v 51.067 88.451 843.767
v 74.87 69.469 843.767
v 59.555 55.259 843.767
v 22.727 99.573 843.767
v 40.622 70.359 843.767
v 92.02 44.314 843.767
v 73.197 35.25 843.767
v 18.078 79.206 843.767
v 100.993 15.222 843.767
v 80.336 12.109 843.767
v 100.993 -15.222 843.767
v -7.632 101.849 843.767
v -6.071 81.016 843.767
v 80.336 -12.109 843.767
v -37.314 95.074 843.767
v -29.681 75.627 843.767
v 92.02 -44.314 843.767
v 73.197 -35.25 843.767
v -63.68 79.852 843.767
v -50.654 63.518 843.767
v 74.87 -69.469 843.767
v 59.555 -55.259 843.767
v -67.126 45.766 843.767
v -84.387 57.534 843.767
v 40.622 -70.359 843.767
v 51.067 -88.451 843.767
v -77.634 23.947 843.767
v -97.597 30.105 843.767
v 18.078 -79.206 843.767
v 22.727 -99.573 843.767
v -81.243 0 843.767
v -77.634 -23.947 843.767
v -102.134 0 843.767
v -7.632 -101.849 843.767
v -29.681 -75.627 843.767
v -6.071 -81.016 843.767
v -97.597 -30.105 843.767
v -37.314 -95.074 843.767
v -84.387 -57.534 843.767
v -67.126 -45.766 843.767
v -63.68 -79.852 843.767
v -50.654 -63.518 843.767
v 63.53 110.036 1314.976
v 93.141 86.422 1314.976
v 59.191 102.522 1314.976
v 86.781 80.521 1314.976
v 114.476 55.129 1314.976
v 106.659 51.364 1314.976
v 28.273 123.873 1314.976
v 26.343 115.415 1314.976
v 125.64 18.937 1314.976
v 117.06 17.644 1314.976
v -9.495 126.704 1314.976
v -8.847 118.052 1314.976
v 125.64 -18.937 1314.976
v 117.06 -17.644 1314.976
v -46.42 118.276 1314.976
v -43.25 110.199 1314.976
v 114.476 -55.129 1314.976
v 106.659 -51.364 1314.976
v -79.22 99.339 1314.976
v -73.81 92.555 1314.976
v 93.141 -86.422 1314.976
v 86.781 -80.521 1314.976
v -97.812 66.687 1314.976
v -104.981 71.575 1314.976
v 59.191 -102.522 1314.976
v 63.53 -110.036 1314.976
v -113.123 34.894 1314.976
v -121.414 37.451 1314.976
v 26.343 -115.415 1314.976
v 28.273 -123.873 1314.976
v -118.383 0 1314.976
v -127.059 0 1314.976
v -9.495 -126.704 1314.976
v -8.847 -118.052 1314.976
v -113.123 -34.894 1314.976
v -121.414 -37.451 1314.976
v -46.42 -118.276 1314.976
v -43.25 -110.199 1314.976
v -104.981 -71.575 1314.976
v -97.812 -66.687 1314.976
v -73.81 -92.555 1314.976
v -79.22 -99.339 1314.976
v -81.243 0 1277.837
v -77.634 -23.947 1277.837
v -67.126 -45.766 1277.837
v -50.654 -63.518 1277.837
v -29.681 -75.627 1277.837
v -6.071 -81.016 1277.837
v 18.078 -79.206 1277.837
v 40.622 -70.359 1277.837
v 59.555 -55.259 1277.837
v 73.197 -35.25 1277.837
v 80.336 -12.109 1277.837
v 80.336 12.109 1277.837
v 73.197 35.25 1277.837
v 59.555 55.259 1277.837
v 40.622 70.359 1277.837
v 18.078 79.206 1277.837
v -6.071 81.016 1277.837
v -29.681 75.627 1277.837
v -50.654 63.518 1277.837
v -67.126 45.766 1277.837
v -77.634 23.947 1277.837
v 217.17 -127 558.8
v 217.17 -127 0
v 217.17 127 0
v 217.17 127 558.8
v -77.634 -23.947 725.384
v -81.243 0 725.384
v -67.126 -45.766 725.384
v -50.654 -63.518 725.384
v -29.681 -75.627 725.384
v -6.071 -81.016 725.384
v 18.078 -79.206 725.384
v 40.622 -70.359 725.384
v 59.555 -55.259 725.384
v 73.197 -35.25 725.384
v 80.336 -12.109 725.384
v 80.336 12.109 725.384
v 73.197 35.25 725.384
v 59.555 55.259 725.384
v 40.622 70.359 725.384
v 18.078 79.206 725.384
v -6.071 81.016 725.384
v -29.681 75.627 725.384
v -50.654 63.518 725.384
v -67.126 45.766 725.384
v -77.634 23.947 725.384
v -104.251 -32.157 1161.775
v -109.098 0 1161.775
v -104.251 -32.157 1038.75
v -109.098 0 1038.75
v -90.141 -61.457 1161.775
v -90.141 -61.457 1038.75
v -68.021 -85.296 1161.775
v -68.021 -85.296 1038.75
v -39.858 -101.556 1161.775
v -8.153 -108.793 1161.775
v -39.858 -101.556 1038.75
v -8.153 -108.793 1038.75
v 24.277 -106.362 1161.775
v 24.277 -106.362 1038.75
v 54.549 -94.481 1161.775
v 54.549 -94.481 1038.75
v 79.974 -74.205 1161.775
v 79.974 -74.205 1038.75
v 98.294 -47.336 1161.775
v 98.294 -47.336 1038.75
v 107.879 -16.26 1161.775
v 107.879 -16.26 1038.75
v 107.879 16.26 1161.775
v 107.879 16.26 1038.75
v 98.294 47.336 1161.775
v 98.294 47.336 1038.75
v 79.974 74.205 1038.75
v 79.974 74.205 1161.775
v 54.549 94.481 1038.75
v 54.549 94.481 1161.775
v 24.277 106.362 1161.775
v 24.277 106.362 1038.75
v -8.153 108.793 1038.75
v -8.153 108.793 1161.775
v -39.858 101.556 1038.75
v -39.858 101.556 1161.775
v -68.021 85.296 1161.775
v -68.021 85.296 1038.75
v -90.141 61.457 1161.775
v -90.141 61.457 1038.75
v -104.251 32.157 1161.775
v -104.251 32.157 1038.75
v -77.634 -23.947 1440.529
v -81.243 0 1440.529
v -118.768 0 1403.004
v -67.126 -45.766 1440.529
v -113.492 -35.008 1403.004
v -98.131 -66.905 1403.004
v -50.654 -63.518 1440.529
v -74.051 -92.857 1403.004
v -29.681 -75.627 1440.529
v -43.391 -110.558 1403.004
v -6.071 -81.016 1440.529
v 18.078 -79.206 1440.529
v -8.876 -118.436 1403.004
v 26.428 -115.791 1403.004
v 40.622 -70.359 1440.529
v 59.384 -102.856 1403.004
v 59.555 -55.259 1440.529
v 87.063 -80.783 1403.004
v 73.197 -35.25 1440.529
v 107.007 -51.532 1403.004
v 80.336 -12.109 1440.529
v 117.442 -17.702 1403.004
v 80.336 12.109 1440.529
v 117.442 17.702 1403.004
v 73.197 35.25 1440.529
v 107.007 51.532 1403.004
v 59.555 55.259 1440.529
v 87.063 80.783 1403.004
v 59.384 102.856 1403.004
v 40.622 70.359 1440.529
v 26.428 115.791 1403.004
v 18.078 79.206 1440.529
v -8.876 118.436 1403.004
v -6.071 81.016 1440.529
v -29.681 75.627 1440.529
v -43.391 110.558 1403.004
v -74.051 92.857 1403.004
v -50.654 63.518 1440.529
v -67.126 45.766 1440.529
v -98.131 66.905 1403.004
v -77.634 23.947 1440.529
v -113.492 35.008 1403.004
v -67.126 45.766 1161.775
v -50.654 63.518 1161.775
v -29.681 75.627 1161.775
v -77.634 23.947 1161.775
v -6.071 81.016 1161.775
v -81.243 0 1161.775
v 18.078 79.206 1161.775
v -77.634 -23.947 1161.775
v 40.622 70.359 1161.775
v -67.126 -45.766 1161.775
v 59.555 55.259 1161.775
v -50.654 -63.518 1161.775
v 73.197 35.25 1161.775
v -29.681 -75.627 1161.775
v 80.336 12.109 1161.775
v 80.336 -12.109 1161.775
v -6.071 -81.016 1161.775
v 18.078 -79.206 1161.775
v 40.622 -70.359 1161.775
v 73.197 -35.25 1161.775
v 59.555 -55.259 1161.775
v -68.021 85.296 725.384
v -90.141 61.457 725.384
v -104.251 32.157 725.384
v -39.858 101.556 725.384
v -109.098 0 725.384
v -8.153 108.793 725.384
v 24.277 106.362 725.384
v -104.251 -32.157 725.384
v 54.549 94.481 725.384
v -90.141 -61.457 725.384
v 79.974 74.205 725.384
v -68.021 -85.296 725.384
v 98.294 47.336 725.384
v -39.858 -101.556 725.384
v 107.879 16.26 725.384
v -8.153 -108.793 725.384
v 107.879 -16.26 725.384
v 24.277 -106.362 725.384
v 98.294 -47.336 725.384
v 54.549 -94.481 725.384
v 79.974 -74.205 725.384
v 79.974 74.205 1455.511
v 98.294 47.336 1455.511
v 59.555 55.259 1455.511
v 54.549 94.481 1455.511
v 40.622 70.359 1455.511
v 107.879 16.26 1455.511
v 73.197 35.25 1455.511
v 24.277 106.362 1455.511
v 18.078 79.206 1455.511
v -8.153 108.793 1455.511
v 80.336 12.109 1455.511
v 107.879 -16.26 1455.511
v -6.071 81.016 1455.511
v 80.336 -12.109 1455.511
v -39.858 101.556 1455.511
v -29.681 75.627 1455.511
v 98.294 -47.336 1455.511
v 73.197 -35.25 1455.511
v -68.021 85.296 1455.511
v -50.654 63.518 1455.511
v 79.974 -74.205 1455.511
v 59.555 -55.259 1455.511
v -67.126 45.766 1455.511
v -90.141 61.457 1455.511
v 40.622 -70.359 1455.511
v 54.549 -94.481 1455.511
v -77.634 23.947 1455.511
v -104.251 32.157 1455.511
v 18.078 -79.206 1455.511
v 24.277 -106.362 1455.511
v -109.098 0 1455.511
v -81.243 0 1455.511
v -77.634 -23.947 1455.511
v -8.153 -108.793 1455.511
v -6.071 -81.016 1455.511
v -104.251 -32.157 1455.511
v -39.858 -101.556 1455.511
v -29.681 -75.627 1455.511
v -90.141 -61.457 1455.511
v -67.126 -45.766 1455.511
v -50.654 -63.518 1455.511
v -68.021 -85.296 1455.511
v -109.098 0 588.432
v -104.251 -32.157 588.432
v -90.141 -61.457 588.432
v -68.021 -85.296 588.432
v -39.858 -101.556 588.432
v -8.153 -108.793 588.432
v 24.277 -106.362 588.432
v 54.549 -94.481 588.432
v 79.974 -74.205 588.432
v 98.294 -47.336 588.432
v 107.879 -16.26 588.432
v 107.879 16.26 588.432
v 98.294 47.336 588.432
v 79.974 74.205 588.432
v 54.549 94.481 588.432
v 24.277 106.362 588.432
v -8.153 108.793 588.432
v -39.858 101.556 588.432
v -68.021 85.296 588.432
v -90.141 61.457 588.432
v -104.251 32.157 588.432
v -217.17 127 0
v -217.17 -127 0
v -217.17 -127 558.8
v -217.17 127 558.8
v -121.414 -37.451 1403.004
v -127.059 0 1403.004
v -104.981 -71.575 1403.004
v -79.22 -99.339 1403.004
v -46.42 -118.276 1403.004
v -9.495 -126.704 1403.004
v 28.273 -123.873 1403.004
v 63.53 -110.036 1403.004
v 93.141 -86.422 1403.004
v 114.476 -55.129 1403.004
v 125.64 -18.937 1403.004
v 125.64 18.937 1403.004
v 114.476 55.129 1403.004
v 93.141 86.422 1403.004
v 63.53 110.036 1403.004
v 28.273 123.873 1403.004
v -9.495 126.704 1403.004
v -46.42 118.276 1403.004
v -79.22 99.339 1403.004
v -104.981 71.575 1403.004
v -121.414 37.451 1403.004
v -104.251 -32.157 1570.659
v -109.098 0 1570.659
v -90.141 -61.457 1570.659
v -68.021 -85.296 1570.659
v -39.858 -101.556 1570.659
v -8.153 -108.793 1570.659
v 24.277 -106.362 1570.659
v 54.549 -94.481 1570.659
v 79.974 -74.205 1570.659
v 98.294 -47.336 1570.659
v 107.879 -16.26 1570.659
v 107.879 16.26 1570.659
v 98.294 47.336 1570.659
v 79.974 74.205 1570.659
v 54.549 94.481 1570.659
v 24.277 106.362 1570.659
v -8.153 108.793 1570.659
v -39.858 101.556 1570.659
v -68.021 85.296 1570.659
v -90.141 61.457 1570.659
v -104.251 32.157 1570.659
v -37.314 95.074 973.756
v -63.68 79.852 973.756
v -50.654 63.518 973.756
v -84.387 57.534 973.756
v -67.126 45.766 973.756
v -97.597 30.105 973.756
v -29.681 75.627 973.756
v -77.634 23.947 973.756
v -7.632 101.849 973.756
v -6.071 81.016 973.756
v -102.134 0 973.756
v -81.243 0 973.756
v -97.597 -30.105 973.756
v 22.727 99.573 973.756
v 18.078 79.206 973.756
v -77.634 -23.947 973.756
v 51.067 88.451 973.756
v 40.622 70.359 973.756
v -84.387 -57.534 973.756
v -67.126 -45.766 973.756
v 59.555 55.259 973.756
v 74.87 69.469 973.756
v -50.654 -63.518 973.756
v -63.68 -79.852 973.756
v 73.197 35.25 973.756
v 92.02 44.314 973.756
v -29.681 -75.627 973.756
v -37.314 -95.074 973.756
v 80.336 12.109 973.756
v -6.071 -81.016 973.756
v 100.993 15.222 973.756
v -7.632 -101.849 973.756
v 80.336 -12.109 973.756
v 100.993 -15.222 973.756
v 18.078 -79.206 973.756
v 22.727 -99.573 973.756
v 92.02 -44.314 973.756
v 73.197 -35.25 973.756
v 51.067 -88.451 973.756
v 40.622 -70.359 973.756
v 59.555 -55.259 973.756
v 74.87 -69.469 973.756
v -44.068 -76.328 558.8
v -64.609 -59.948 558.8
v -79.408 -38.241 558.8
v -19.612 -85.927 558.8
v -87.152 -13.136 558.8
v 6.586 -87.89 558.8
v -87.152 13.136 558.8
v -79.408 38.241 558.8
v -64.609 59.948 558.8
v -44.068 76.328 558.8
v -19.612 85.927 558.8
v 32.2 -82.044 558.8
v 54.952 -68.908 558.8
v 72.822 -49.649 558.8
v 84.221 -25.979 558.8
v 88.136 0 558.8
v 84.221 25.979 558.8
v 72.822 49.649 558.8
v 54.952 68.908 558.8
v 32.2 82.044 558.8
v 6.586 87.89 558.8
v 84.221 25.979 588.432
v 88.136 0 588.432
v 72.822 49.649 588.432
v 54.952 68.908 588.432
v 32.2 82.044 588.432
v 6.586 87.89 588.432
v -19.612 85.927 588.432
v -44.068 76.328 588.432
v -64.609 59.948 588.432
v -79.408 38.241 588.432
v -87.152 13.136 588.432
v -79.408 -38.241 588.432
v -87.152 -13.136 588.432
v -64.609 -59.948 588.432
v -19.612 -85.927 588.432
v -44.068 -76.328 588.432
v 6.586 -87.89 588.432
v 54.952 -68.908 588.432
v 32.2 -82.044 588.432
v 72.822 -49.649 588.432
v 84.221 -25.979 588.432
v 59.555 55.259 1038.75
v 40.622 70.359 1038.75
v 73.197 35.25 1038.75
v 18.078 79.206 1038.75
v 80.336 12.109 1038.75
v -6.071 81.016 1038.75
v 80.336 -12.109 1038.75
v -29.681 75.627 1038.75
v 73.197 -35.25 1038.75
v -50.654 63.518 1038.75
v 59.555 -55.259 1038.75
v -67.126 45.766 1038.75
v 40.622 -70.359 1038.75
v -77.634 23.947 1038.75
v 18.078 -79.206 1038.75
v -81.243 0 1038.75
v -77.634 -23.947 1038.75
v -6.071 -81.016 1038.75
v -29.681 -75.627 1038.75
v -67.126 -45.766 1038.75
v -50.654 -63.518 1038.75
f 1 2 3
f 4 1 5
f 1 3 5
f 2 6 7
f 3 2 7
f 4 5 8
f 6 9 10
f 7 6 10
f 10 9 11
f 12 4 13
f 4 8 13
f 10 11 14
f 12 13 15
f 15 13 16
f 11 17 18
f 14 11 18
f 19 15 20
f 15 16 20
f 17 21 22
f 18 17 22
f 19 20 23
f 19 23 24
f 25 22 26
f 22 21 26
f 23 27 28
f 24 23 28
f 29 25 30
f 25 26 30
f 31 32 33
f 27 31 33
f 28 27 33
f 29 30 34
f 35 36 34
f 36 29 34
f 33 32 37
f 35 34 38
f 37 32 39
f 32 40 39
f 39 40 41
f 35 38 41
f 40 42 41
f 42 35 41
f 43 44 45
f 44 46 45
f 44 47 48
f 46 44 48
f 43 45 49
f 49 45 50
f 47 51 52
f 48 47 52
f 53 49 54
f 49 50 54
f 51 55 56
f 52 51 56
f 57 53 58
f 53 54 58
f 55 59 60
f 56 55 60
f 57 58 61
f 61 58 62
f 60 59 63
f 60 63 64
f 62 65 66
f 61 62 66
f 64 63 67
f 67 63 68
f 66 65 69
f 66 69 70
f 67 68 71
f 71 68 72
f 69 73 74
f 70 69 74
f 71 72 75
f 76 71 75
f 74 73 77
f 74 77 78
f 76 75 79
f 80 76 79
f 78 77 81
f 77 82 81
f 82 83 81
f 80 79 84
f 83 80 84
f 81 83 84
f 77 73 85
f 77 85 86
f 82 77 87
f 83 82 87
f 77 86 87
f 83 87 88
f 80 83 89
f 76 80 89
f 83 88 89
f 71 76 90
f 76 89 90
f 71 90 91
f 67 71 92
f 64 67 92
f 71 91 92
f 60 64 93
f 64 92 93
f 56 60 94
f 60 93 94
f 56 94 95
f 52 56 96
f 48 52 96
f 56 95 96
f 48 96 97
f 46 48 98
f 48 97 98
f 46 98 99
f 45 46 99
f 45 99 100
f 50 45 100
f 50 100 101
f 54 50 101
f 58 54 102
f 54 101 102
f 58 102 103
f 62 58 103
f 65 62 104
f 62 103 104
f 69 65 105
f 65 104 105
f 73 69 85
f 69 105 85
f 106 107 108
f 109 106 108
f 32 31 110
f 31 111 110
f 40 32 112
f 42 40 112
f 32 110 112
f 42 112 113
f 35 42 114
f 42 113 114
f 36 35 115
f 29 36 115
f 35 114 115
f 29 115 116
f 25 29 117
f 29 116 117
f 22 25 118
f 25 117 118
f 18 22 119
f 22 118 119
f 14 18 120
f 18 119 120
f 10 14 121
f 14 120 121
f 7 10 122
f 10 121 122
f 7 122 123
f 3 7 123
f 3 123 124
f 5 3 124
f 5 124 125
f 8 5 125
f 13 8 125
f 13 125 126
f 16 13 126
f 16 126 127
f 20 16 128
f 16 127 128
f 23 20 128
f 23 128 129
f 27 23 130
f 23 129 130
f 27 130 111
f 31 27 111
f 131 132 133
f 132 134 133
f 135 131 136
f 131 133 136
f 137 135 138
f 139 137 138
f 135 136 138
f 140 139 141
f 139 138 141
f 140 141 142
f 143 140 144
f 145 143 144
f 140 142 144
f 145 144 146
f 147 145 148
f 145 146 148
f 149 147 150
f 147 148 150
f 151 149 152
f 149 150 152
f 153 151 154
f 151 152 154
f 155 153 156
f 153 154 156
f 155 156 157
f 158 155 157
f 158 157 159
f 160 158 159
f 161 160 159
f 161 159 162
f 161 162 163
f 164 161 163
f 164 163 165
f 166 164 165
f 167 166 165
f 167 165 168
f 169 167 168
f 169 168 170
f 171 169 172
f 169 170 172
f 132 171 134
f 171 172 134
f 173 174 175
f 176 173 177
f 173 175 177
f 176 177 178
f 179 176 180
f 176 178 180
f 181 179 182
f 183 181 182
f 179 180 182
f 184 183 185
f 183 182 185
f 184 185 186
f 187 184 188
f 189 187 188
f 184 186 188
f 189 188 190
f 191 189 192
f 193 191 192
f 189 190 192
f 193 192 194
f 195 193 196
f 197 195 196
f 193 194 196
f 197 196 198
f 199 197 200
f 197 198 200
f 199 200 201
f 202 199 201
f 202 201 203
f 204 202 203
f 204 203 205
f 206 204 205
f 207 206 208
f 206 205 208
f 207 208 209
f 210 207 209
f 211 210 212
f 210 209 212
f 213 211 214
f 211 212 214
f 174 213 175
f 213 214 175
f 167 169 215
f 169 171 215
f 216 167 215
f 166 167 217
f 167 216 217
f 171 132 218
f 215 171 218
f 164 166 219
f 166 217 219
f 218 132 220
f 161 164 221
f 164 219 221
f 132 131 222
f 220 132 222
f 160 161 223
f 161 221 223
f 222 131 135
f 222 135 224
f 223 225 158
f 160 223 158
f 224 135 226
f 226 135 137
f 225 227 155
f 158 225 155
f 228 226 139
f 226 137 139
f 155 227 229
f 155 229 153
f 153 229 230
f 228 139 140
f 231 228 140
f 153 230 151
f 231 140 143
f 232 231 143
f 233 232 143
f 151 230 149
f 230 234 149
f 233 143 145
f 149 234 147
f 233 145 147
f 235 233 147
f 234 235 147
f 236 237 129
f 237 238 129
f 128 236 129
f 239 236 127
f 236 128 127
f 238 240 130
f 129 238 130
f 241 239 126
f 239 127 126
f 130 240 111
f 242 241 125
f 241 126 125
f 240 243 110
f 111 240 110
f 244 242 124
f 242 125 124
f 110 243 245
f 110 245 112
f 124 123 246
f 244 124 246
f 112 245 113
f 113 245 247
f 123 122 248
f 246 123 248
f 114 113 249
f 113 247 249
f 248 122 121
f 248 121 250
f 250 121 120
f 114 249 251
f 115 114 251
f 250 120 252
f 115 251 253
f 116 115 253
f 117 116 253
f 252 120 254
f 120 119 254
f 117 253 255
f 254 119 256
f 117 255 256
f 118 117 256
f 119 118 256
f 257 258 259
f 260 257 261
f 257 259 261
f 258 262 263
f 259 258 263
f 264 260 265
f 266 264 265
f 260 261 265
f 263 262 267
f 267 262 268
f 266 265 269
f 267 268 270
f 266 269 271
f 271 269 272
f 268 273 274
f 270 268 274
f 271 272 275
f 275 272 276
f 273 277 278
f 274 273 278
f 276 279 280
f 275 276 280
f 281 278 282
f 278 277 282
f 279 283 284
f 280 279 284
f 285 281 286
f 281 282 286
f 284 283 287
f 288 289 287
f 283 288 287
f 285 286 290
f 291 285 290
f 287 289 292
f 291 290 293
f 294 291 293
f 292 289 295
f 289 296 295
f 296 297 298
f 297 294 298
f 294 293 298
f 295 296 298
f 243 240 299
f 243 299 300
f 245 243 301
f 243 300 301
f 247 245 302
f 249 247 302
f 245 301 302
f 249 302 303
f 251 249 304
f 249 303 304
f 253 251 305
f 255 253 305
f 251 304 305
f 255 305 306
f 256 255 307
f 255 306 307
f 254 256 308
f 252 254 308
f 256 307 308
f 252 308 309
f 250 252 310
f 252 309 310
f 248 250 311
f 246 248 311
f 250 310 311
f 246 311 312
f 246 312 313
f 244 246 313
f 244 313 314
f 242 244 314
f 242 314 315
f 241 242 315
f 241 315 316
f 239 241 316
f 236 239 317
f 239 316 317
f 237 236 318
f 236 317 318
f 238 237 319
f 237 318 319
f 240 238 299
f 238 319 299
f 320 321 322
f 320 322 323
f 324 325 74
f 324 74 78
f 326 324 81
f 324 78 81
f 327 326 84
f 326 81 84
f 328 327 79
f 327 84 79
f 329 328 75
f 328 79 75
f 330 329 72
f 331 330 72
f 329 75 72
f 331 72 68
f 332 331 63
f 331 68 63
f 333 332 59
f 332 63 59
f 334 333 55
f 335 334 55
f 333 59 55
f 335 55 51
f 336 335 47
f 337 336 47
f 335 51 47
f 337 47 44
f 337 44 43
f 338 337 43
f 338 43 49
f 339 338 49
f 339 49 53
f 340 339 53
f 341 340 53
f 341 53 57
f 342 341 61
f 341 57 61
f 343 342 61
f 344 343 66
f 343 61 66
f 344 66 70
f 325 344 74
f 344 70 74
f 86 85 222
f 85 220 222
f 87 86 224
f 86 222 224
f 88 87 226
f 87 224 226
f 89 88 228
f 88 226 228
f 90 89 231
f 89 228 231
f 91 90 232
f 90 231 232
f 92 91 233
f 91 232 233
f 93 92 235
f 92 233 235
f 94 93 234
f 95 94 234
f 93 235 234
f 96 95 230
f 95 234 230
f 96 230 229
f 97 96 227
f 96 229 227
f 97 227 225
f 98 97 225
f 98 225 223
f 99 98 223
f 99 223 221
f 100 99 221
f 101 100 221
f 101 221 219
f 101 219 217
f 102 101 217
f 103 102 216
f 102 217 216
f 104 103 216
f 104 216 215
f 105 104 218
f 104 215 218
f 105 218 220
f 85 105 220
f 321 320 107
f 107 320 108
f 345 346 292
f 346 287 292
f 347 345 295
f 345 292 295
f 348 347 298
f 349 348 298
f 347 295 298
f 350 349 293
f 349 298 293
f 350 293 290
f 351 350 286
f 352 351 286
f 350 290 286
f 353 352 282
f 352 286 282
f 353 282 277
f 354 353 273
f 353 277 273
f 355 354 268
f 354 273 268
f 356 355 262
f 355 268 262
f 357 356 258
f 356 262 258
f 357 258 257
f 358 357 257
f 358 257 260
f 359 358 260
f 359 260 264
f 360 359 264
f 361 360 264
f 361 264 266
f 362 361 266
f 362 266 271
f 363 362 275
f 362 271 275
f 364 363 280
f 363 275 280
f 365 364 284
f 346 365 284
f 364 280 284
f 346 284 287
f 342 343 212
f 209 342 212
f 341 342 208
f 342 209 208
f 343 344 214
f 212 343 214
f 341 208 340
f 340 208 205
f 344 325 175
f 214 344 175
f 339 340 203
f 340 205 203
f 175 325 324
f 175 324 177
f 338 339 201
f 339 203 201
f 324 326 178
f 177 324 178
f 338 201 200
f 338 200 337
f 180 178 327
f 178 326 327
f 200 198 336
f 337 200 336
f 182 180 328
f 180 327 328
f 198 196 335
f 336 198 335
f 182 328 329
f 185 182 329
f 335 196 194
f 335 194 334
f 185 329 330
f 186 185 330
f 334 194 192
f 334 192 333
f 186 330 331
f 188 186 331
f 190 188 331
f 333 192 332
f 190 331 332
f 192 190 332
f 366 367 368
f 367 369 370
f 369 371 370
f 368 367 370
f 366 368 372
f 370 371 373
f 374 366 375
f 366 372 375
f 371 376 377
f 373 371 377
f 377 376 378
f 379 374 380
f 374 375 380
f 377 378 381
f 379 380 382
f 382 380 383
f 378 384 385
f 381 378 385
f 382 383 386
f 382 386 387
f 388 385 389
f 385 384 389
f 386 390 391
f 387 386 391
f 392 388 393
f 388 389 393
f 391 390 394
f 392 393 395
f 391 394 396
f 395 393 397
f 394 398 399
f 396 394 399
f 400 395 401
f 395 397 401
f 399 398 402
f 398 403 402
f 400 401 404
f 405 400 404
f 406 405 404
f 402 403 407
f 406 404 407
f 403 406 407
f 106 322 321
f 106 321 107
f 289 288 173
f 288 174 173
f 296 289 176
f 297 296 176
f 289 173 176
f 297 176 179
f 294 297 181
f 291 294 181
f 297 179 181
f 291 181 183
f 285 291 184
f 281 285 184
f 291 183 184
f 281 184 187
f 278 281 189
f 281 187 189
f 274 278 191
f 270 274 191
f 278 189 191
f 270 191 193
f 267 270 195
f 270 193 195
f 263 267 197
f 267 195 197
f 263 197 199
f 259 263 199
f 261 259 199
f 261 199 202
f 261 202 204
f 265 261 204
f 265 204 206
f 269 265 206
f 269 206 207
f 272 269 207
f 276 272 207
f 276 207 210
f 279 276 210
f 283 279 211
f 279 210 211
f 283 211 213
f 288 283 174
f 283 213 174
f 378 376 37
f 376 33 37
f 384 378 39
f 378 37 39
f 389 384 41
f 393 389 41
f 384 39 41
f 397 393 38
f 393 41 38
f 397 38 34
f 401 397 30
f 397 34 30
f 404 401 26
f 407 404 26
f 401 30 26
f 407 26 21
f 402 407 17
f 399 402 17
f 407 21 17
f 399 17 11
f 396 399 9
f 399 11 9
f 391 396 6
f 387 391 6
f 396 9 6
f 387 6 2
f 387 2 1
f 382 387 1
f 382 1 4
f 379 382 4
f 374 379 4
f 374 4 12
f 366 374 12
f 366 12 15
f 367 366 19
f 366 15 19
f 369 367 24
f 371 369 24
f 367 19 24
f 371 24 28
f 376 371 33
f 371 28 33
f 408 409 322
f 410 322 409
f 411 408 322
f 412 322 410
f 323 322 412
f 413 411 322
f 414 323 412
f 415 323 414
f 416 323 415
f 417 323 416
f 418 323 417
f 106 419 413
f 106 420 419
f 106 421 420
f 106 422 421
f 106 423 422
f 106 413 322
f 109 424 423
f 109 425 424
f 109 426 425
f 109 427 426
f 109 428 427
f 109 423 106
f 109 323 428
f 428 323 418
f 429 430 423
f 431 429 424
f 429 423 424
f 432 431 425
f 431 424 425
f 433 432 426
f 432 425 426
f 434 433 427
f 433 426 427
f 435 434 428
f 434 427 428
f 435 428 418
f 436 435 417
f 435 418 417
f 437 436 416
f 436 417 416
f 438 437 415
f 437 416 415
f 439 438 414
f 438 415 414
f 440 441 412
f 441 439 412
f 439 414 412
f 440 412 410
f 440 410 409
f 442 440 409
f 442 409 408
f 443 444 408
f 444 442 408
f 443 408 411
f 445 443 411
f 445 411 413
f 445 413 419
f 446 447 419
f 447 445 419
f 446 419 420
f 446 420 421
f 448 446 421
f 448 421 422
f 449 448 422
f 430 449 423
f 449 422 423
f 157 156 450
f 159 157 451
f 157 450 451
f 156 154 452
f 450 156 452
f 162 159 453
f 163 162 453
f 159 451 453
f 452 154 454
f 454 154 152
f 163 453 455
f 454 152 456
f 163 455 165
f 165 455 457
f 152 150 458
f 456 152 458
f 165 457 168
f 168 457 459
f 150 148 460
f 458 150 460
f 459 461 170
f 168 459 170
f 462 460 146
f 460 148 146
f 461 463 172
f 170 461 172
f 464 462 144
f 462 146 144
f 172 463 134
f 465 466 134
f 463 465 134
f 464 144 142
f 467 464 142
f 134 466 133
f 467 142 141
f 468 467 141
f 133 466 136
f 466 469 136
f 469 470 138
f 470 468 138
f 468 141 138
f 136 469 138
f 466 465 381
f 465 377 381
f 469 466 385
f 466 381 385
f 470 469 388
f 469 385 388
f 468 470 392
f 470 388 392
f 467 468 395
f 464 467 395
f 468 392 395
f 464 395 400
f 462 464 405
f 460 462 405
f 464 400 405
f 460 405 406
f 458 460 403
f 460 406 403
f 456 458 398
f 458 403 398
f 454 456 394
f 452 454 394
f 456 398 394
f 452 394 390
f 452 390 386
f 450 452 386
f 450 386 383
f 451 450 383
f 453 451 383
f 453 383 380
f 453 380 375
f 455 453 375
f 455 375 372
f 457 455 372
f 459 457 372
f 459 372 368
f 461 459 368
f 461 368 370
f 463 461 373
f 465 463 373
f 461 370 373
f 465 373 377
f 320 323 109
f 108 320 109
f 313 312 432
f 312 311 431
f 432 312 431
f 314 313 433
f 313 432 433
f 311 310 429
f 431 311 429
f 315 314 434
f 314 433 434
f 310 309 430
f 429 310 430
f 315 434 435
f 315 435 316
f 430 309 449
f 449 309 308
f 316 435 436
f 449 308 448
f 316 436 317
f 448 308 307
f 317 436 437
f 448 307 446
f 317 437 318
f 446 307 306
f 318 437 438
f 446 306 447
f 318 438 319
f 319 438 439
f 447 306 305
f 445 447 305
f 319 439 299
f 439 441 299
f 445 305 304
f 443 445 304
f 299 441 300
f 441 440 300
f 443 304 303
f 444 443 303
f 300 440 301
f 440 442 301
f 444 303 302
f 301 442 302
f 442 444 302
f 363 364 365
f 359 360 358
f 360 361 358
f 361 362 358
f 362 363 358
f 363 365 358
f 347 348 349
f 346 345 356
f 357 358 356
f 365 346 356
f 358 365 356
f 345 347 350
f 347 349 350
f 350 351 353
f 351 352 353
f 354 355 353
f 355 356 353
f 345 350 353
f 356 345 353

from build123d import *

# Parameters (mm, degrees)
F0_W     = 434.34
F0_H     = 254
F1_DEPTH = 558.8
F2_R     = 88.136421
F3_DEPTH = 76.2


with BuildPart() as f1:
    # F0 (on Top) → F1 (new body)
    with BuildSketch(Plane.XY):
        Rectangle(F0_W, F0_H)
    extrude(amount=F1_DEPTH)

    # F2 (on face) → F3 (join)
    with BuildSketch(Plane.XY.offset(558.8)):
        Circle(F2_R)
    extrude(amount=F3_DEPTH)

    # F4 (on Front) → F5 (revolve)
    with BuildSketch(Plane.XZ):
        Polygon((-109.097786, 588.431537), (0, 588.431537), (0, 725.384057), (0, 843.766749), (0, 1038.749933), (0, 1161.775112), (0, 1570.658565), (-109.097786, 1570.658565), (-109.097786, 1455.510974), (-81.243046, 1455.510974), (-81.243046, 1440.529093), (-118.768431, 1403.003693), (-127.059057, 1403.003693), (-127.059057, 1314.976215), (-118.382715, 1314.976215), (-81.243046, 1277.836561), (-81.243046, 1161.775112), (-109.097786, 1161.775112), (-109.097786, 1038.749933), (-81.243046, 1038.749933), (-81.243046, 973.755538), (-102.134109, 973.755538), (-102.134109, 843.766749), (-81.243046, 843.766749), (-81.243046, 725.384057), (-109.097786, 725.384057), align=None)
    revolve(axis=Axis((0, 0, 1635.457158), (0, 0, 1)))


solid = f1.part
